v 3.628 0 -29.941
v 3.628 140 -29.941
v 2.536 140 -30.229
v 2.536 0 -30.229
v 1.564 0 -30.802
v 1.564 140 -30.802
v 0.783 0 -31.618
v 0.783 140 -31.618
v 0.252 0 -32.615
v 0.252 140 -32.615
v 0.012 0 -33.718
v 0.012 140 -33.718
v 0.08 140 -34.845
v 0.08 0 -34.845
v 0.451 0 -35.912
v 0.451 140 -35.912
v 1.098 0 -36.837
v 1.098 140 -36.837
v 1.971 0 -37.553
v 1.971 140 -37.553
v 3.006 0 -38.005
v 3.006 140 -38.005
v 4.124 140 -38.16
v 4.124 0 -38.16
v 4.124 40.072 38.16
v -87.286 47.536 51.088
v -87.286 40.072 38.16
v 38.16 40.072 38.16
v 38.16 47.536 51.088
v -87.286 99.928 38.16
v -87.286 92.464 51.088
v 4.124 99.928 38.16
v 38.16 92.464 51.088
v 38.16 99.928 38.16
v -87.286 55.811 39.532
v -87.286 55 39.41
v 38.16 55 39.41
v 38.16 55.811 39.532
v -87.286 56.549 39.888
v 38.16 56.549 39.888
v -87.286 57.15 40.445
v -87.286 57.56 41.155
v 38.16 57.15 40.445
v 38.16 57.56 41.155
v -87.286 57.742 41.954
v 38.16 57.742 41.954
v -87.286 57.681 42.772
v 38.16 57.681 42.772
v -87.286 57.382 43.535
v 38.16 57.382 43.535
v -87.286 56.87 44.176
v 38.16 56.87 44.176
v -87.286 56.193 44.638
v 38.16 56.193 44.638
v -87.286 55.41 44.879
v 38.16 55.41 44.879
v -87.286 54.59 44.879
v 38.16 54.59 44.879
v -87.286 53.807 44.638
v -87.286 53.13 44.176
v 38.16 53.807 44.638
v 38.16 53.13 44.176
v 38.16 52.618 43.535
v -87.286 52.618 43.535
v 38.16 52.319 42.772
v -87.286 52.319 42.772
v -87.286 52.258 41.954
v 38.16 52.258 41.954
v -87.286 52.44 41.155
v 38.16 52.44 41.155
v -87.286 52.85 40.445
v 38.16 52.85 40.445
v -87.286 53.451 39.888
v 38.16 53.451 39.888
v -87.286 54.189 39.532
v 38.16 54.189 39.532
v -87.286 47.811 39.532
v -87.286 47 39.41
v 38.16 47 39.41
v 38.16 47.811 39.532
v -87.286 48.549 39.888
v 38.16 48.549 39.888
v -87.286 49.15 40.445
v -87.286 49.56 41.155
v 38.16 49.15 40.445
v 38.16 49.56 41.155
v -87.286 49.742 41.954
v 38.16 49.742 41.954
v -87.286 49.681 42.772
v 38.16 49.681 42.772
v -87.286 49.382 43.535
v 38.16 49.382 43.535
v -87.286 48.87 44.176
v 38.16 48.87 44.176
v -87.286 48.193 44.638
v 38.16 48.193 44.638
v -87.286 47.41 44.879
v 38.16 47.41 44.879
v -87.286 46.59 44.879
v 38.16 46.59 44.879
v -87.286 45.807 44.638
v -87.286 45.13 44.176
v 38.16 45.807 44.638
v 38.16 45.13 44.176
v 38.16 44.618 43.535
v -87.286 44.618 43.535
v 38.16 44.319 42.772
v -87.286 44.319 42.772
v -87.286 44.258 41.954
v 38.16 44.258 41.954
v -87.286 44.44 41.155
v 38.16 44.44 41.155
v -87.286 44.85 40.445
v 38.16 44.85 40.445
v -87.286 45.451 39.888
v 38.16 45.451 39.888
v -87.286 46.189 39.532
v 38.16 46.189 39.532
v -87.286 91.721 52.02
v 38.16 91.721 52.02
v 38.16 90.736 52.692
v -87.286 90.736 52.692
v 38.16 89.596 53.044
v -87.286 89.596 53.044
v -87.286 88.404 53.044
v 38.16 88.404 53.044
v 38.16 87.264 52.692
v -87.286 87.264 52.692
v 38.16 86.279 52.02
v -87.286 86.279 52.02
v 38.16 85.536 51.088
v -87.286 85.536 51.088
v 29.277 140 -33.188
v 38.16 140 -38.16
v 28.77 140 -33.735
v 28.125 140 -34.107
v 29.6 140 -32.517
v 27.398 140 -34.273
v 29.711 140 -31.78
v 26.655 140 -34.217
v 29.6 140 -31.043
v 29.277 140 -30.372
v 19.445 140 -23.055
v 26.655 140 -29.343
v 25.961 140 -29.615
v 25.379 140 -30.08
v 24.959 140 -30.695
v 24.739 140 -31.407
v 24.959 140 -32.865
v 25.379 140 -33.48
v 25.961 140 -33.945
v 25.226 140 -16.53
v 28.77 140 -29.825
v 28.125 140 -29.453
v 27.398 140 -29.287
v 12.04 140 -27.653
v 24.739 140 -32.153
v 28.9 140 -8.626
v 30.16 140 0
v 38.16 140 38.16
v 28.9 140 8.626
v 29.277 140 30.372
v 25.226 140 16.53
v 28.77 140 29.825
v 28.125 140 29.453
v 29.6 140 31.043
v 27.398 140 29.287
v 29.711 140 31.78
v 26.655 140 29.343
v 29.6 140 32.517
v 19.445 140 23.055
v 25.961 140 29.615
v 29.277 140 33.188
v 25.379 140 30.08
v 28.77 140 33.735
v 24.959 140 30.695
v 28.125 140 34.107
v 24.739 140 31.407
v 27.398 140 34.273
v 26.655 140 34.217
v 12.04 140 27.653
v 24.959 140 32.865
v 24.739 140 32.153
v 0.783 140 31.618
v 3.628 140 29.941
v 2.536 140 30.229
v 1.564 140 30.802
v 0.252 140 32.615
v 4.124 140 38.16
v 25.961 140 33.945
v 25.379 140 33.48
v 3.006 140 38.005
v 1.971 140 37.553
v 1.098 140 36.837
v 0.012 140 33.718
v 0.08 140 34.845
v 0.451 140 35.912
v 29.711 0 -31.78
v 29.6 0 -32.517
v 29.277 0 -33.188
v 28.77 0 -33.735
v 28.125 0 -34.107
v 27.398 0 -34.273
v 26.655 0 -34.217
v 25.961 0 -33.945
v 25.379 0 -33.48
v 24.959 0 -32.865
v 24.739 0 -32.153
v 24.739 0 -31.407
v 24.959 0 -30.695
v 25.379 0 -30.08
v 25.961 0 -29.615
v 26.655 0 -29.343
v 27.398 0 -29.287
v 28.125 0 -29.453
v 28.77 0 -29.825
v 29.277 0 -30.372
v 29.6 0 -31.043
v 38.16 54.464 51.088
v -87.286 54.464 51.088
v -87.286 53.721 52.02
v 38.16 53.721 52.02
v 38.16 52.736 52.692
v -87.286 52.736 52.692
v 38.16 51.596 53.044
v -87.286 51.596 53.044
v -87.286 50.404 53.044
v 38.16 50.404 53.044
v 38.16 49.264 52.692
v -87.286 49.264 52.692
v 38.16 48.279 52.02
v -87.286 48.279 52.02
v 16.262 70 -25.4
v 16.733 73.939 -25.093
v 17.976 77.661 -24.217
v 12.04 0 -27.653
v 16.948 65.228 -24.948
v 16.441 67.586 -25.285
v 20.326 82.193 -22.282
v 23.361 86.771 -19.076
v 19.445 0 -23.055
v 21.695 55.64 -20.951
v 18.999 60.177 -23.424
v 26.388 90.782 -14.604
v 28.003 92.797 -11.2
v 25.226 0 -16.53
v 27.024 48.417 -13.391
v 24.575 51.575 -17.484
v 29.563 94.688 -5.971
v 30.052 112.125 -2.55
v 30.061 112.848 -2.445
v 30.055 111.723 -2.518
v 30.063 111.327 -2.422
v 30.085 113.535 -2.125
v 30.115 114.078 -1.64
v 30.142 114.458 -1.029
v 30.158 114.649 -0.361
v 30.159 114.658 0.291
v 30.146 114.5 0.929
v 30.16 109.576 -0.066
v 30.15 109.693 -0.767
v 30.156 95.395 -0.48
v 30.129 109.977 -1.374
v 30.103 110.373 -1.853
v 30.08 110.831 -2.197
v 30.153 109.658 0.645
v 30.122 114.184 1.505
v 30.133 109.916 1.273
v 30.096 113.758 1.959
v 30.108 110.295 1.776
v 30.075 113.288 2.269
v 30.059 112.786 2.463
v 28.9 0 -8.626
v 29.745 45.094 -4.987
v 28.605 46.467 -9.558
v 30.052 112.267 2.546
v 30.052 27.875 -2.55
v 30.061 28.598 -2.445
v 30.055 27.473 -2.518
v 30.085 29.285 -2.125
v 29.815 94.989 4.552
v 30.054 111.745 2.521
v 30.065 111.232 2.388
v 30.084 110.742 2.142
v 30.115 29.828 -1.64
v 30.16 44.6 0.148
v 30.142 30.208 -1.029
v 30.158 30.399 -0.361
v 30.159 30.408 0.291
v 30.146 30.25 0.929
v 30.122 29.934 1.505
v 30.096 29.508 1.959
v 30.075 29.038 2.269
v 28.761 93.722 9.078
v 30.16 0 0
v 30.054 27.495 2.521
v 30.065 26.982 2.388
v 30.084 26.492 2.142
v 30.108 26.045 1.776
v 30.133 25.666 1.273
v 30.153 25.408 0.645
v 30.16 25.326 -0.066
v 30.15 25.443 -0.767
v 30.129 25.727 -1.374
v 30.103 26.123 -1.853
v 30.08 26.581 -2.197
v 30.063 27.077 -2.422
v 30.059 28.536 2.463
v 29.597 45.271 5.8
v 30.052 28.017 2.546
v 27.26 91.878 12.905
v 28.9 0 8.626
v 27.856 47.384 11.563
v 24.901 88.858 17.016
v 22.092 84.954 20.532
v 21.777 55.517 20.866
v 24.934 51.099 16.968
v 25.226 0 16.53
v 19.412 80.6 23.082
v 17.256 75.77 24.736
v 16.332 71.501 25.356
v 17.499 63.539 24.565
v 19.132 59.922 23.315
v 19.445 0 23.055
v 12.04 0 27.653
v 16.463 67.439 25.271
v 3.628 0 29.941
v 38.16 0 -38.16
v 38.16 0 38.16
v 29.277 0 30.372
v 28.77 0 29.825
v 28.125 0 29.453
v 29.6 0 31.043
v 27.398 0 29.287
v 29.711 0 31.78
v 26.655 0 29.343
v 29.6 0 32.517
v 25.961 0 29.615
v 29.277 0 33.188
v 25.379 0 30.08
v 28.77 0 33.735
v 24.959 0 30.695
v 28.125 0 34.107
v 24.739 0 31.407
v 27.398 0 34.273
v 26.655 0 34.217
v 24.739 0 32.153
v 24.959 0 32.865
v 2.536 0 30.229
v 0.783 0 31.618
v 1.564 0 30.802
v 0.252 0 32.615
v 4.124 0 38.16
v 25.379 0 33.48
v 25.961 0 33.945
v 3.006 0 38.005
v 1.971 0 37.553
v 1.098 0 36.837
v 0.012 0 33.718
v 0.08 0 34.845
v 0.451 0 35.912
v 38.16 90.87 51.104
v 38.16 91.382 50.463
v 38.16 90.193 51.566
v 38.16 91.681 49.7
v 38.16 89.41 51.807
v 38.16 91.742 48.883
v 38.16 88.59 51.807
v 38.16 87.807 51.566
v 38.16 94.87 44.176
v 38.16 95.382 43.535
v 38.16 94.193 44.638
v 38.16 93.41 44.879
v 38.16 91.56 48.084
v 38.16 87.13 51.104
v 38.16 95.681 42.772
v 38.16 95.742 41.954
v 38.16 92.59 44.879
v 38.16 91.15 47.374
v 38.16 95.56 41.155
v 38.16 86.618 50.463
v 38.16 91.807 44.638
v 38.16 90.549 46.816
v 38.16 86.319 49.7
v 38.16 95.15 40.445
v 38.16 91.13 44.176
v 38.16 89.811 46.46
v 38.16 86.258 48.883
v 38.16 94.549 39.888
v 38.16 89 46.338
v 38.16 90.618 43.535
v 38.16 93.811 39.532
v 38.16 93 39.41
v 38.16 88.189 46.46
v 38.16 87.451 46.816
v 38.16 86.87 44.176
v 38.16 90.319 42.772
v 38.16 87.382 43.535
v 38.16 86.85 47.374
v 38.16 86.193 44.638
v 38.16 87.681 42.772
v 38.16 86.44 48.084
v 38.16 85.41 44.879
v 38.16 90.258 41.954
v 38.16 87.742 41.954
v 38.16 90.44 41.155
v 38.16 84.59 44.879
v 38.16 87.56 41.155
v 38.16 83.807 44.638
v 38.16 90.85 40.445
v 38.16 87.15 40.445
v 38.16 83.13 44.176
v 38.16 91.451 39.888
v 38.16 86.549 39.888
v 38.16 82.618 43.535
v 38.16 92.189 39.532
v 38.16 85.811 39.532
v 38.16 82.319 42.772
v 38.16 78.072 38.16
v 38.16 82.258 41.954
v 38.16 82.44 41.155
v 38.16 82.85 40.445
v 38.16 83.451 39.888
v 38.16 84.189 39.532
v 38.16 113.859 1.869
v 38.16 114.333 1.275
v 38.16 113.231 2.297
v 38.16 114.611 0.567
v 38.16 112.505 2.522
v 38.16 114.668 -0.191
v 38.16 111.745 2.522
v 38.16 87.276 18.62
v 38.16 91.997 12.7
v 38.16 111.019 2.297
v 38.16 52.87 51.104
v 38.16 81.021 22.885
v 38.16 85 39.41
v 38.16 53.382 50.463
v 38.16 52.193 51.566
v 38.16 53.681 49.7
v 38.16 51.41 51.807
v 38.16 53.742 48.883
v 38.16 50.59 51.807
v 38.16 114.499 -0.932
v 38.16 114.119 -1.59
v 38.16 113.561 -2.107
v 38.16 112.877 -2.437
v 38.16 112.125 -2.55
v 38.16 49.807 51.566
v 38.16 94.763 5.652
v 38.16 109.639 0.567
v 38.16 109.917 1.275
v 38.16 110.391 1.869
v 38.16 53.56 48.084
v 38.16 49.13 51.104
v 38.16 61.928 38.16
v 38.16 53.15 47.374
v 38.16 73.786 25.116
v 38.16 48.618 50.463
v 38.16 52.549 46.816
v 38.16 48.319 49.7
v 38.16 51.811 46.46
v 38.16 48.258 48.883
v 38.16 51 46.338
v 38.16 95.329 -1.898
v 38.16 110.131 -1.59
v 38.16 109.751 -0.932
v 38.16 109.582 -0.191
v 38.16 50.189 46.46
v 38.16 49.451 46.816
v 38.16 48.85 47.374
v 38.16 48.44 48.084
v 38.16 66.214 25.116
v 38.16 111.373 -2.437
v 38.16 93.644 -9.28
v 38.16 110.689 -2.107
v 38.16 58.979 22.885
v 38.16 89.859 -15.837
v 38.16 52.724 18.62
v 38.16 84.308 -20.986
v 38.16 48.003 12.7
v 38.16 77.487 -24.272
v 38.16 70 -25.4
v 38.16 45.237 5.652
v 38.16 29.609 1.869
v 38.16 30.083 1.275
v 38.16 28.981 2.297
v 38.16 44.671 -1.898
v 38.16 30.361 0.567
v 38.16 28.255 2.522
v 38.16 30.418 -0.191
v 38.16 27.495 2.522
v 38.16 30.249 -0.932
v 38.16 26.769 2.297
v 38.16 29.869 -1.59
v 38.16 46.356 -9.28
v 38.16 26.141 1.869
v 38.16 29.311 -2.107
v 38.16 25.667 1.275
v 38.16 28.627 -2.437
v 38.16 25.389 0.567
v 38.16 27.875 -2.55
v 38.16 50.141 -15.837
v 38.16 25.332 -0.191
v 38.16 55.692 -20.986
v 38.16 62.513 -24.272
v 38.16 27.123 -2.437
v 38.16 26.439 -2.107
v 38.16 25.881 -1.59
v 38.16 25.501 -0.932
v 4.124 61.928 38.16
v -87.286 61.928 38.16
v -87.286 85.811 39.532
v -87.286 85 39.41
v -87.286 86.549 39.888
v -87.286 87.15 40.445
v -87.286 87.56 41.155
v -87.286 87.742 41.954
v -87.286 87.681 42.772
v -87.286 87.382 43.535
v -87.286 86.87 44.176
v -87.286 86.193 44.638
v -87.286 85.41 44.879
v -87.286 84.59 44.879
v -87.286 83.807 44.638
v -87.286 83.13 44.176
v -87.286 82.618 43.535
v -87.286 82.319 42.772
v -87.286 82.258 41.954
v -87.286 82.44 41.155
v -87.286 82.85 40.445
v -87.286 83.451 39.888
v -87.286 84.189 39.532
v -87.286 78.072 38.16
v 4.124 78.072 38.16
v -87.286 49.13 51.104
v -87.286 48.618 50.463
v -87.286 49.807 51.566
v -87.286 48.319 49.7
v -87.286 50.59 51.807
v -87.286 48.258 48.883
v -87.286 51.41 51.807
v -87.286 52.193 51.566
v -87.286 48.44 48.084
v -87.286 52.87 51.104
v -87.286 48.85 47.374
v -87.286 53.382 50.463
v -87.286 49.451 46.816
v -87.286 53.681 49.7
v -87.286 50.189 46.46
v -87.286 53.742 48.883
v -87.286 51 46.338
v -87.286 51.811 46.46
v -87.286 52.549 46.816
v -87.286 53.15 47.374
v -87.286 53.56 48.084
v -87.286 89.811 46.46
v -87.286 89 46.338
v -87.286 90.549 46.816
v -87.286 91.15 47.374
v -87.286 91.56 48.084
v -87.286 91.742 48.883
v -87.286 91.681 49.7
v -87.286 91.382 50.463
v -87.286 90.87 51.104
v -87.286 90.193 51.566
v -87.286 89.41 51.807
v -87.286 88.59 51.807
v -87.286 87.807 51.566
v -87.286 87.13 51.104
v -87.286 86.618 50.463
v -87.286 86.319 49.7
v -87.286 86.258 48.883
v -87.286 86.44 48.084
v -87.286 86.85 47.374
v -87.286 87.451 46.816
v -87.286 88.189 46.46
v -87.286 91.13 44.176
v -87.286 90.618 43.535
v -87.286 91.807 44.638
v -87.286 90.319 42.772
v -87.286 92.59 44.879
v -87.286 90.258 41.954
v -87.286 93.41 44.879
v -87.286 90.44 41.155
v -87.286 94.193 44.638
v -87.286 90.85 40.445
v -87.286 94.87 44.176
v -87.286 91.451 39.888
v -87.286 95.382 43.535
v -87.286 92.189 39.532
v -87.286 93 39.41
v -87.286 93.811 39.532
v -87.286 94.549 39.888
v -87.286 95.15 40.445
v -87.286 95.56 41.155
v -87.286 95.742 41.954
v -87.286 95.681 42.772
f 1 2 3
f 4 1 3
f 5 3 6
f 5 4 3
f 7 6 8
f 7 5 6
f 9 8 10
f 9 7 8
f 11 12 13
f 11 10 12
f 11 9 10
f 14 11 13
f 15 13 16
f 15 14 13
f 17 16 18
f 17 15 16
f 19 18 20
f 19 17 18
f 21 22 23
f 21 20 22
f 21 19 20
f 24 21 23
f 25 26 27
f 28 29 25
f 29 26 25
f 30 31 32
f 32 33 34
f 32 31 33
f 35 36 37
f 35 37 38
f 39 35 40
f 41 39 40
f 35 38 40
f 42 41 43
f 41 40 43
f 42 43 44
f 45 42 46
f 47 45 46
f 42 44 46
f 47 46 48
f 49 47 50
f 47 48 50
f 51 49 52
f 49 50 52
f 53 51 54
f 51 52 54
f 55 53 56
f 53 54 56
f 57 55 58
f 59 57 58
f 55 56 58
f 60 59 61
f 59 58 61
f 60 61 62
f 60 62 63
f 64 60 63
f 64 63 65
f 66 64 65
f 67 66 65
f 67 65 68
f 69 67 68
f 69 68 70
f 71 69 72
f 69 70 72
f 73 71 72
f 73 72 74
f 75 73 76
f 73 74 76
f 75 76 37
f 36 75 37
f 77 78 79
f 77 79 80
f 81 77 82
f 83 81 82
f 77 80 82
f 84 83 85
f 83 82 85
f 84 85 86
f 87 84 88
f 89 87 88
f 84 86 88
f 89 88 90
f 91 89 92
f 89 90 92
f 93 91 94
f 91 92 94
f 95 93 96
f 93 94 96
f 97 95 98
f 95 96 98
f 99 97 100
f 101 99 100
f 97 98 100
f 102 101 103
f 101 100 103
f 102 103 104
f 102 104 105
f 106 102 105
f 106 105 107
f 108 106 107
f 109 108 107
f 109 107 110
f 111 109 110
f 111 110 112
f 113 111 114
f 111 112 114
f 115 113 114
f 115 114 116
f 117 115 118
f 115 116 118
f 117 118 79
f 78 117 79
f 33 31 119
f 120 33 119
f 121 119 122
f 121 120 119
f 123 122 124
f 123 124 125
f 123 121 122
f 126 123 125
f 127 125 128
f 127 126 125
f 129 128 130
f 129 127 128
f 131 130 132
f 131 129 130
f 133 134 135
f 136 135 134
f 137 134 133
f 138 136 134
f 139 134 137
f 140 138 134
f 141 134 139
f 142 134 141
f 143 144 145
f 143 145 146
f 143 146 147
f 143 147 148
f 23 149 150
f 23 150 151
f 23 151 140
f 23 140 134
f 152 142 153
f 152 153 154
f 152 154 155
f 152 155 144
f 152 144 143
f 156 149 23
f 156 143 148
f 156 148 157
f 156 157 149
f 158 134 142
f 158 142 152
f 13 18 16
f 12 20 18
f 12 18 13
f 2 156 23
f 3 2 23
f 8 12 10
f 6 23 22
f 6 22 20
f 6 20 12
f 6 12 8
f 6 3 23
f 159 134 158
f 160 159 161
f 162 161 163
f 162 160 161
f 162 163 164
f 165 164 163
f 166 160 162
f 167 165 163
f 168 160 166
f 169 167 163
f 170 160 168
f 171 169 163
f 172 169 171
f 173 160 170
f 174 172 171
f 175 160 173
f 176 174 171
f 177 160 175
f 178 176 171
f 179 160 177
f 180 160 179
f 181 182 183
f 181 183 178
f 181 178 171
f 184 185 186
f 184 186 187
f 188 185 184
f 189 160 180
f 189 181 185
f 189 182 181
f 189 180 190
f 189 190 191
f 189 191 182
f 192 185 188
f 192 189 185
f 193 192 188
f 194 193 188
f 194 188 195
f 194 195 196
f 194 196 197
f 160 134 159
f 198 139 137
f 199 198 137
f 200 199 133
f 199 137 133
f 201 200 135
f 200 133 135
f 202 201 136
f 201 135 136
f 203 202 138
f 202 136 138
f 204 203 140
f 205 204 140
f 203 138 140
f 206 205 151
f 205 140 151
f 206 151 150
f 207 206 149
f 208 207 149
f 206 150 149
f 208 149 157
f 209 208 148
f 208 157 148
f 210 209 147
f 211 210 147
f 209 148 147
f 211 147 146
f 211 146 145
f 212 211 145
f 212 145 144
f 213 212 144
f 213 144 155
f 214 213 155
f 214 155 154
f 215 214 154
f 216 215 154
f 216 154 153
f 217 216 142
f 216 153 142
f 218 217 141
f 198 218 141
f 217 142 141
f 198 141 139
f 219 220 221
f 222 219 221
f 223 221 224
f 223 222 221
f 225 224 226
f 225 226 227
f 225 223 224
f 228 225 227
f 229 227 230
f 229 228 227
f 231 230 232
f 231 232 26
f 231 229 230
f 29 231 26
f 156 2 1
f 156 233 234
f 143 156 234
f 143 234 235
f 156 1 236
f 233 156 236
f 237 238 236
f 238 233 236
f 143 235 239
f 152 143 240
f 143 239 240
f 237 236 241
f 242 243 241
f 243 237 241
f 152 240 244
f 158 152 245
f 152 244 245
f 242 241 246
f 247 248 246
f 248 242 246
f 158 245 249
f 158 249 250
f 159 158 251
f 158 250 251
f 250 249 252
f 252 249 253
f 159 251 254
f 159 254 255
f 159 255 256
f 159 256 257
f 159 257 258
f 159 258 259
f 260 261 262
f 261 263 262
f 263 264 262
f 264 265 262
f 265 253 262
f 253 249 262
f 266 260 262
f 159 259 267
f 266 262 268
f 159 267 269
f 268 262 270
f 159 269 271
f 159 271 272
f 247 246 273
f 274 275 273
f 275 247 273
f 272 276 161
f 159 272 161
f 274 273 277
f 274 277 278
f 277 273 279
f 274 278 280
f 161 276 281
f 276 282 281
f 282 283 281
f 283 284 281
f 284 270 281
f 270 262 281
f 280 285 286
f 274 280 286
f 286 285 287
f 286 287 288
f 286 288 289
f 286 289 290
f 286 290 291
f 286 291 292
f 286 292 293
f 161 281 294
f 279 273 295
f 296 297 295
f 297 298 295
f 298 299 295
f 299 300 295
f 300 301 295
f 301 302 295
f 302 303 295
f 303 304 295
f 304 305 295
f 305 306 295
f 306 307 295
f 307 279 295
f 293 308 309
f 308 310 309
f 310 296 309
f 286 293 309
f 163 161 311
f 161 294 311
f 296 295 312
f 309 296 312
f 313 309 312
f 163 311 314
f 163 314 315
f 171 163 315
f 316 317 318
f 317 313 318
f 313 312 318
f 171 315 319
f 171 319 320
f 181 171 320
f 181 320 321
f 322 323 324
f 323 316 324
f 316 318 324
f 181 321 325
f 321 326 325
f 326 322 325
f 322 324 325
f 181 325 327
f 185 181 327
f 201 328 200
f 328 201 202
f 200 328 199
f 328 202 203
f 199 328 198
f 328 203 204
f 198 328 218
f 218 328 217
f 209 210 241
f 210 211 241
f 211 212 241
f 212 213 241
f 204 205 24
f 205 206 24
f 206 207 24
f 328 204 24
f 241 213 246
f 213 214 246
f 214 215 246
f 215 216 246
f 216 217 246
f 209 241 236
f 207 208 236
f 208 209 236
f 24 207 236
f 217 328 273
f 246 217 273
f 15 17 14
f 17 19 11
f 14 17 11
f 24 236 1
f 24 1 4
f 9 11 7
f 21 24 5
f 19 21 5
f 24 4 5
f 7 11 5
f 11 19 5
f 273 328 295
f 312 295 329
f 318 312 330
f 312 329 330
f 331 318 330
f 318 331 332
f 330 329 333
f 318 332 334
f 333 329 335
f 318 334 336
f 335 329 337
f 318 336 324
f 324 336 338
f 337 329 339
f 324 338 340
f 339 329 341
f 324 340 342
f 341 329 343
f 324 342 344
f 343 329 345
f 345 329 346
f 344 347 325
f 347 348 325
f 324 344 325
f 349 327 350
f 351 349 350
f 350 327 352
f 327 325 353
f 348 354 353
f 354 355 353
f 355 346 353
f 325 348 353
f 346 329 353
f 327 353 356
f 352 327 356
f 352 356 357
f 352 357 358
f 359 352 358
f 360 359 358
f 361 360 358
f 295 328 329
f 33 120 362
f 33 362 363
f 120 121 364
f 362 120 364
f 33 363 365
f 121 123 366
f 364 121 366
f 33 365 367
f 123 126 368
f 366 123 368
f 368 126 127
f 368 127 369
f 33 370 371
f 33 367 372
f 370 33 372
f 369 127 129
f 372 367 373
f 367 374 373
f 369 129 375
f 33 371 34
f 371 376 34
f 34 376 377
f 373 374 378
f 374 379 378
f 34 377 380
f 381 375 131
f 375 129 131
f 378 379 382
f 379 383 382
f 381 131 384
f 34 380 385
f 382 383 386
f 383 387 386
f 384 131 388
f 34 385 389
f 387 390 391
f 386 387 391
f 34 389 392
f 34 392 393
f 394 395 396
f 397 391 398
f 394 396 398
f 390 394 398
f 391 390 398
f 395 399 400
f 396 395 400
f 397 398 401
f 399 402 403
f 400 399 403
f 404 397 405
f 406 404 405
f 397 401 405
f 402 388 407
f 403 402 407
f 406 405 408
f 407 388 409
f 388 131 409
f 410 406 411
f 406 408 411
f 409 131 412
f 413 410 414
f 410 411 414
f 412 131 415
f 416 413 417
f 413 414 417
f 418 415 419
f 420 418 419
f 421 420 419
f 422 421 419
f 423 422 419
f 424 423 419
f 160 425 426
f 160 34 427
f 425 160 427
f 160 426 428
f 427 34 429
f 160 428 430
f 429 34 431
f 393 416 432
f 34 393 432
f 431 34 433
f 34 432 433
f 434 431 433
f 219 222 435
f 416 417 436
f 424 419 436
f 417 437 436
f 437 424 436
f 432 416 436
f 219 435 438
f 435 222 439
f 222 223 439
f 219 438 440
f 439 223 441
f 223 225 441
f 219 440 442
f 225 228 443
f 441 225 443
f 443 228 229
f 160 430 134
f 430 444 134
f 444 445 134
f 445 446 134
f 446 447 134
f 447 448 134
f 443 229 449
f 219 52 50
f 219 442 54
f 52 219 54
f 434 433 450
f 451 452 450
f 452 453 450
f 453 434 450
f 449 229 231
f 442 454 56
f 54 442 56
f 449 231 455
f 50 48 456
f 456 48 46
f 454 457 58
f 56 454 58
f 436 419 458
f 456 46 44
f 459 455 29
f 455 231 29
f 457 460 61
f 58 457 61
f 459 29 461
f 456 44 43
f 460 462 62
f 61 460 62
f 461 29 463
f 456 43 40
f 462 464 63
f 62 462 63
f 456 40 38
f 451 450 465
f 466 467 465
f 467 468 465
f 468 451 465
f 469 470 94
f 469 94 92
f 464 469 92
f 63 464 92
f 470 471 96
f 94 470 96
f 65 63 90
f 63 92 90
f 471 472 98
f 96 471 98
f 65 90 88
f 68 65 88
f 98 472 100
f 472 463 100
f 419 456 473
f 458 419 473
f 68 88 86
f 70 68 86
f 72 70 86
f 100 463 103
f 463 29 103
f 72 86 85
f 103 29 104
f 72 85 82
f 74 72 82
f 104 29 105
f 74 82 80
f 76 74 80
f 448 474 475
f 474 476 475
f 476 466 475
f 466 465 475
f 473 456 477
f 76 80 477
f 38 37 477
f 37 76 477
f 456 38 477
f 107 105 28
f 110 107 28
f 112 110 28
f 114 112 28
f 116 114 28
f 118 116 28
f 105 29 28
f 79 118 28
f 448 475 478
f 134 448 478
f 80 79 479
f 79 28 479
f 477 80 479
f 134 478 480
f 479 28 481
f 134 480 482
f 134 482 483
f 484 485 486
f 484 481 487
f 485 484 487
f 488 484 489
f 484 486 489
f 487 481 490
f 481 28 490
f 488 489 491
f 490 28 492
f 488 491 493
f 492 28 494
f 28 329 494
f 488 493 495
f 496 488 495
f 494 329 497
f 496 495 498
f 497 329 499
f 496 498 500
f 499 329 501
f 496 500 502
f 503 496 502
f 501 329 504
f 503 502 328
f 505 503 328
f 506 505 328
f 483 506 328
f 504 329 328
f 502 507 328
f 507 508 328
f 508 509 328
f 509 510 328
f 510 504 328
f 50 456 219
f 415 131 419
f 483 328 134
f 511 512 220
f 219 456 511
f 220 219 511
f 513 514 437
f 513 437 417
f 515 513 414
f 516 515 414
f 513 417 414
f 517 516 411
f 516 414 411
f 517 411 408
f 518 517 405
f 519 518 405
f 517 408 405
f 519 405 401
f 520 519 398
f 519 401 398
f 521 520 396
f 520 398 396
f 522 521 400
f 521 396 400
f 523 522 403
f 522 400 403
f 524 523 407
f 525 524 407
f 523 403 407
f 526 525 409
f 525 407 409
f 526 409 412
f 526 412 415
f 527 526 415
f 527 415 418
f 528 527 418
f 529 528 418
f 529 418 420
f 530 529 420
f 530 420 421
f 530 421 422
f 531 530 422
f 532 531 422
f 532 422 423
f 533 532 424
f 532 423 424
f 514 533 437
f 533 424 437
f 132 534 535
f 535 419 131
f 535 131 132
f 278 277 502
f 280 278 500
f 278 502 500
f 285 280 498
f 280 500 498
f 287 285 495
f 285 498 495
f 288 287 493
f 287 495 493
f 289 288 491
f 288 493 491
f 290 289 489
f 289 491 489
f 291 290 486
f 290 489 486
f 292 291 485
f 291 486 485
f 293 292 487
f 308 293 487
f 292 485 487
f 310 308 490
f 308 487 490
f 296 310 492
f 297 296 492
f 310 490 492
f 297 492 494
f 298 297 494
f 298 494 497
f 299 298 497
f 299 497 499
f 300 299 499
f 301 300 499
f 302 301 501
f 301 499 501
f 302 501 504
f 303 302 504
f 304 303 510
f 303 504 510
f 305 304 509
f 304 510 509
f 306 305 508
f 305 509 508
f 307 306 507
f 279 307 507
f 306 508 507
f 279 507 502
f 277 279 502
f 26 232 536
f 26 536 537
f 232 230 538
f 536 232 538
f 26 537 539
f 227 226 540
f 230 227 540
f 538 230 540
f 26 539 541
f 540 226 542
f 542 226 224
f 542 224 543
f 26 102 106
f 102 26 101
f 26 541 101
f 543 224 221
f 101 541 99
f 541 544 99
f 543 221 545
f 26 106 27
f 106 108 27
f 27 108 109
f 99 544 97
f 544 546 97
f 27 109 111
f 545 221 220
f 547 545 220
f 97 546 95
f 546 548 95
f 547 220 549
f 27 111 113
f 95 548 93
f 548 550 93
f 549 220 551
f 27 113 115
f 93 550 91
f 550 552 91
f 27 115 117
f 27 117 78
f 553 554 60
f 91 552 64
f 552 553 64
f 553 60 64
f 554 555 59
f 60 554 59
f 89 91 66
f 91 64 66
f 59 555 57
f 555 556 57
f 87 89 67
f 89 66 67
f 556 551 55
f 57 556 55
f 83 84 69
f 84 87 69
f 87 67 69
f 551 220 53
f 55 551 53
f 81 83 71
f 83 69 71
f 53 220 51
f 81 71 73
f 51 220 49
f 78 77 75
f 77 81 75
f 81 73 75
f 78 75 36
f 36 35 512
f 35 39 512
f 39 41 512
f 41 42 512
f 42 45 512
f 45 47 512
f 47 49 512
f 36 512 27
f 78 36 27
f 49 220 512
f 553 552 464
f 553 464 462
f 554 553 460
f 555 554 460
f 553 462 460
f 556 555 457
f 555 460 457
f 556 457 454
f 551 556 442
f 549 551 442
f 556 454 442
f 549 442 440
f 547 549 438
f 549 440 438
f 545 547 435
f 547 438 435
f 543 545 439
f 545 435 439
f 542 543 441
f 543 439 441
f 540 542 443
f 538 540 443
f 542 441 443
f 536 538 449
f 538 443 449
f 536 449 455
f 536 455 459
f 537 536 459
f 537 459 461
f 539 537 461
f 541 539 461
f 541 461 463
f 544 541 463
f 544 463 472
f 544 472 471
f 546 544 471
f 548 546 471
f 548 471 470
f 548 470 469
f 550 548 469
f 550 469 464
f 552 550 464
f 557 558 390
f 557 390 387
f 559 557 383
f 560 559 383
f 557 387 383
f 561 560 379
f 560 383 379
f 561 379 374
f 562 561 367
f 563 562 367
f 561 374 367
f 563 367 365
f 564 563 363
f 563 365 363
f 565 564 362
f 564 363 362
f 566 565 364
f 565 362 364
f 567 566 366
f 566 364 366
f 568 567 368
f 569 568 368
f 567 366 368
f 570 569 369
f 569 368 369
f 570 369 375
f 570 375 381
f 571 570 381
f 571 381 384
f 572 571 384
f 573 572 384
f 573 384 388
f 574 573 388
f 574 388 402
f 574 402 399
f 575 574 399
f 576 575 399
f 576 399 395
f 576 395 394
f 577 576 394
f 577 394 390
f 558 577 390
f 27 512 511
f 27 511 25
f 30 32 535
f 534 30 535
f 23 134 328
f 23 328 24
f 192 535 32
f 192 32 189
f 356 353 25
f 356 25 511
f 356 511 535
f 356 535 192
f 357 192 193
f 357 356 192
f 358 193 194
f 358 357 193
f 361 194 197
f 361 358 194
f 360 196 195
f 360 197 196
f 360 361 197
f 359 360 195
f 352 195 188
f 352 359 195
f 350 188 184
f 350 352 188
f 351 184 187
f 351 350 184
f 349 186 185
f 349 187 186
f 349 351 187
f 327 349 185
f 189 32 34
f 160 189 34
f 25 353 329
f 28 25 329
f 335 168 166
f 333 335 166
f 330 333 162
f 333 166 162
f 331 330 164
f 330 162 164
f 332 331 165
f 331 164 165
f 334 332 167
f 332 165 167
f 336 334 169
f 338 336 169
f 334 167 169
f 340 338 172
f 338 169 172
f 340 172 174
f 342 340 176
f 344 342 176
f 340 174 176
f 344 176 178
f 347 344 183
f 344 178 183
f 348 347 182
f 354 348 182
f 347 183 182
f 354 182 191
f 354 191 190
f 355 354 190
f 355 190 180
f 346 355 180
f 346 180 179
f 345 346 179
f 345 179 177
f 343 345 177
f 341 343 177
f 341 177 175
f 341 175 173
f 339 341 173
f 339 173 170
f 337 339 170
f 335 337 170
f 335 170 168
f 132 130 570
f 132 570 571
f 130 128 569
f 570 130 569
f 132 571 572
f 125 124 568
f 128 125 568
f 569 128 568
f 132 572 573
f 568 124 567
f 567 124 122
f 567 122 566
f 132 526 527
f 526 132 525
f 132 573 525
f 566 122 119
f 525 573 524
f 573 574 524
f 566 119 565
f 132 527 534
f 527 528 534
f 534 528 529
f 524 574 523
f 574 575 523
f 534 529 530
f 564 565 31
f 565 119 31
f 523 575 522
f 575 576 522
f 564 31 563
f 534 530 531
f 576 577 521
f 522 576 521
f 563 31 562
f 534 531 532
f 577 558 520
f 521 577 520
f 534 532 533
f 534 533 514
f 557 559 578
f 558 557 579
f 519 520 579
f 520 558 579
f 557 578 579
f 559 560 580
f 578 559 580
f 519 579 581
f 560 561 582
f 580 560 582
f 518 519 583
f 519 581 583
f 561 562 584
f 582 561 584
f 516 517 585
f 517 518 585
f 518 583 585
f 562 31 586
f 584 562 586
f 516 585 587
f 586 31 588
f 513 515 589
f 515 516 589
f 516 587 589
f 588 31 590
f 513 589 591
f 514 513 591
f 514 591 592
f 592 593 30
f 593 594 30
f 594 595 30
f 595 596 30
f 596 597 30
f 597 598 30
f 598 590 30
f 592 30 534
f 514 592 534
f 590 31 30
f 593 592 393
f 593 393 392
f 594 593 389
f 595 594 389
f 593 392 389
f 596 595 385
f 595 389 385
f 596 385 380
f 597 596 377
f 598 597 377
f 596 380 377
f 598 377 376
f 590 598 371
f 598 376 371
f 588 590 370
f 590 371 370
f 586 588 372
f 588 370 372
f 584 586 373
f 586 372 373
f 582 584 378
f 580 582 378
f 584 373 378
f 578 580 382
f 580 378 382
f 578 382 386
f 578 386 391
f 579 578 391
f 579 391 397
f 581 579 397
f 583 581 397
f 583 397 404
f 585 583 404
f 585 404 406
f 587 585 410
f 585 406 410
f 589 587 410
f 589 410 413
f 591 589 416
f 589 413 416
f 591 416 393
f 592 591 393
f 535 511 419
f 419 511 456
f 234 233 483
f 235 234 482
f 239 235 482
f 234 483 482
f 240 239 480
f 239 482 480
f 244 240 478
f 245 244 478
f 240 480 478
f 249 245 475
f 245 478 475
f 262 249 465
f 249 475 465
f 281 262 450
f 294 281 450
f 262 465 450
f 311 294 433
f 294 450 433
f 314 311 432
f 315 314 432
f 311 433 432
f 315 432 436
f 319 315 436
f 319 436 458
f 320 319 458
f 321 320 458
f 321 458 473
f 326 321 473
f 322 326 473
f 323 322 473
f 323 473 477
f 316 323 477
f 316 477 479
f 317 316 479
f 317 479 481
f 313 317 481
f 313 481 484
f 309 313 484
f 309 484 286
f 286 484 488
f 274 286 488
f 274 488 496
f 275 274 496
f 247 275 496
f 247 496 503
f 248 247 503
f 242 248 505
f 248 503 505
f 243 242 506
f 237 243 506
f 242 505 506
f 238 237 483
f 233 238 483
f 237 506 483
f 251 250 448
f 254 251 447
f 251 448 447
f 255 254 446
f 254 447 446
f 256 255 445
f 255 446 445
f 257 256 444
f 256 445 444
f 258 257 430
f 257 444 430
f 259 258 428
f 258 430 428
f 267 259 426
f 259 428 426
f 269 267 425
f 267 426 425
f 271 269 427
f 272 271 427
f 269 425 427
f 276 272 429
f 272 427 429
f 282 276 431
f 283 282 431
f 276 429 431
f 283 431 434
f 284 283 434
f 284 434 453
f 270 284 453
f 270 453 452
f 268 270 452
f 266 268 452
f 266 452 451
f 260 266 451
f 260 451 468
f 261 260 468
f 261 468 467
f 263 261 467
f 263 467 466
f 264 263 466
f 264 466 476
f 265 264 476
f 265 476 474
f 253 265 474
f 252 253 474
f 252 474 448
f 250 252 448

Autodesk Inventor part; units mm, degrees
ref_plane "YZ Plane" through (0, 0, 0) normal (1, 0, 0) x (0, 1, 0)
ref_plane "XZ Plane" through (0, 0, 0) normal (0, 1, 0) x (-1, 0, 0)
sketch "Sketch1" plane through (0, 0, 0) normal (0, 1, 0) x (-1, 0, 0)
  arc A0 (0, 30.16) -> (-3.6283, 29.941) centre (0, 0) ccw construction
  arc A1 (-26.9832, 26.9832) -> (-36.0277, -12.5774) centre (0, 0) ccw construction
  line L0 (38.16, 38.16) -> (0, 38.16) construction
  line L1 (-38.16, 38.16) -> (-38.16, -38.16)
  line L2 (-38.16, -38.16) -> (-4.1245, -38.16)
  line L3 (38.16, -38.16) -> (38.16, 38.16) construction
  line L4 (38.16, 38.16) -> (-21.3263, -21.3263) construction
  line L5 (-38.16, 38.16) -> (-21.3263, 21.3263) construction
  line L6 (0, 38.16) -> (-4.1245, 38.16) construction
  line L7 (0, -38.16) -> (38.16, -38.16) construction
  arc A2 (0, 38.16) -> (-26.9832, 26.9832) centre (0, 0) ccw construction
  arc A3 (-36.9415, -9.566) -> (-26.9832, -26.9832) centre (0, 0) ccw construction
  arc A4 (-26.9832, -26.9832) -> (0, -38.16) centre (0, 0) ccw construction
  arc A5 (0, -38.16) -> (0, 38.16) centre (0, 0) ccw construction
  line L8 (-21.3263, 21.3263) -> (38.16, -38.16) construction
  line L9 (-21.3263, -21.3263) -> (-38.16, -38.16) construction
  line L10 (0, 38.16) -> (0, 30.16) construction
  line L11 (0, -30.16) -> (0, -38.16) construction
  arc A6 (21.3263, 21.3263) -> (0, 30.16) centre (0, 0) ccw construction
  arc A7 (0, -30.16) -> (21.3263, 21.3263) centre (0, 0) ccw construction
  arc A8 (-6.0651, -37.6749) -> (-3.6283, -29.941) centre (-4.1245, -34.0355) ccw
  arc A9 (-3.6283, 29.941) -> (-6.0651, 37.6749) centre (-4.1245, 34.0355) ccw
  line L12 (-4.1245, -38.16) -> (0, -38.16) construction
  arc A10 (-3.6283, -29.941) -> (0, -30.16) centre (0, 0) ccw construction
  arc A11 (-3.6283, 29.941) -> (-3.6283, -29.941) centre (0, 0) ccw
  line L13 (-4.1245, 38.16) -> (-38.16, 38.16)
  arc A12 (-3.6283, -29.941) -> (-6.0651, -37.6749) centre (-4.1245, -34.0355) ccw construction
  arc A13 (-6.0651, 37.6749) -> (-3.6283, 29.941) centre (-4.1245, 34.0355) ccw construction
  dimension "d0" = 60.32
  dimension "d1" = 8
extrude "Extrusion1" add sketch "Sketch1" along normal blind 140
sketch "Sketch2" plane through (38.16, 0, 38.16) normal (1, 0, 0) x (0, 0, -1)
  line L0 (8.219, 140) -> (0, 140) projected
  line L1 (0, 140) -> (76.32, 0) construction
  line L2 (76.32, 140) -> (0, 0) construction
  circle A0 centre (38.16, 70) radius 25.4
  dimension "d15" = 50.8
extrude "Extrusion2" cut sketch "Sketch2" against normal up to next
ref_plane "Work Plane1" through (0, 70, 0) normal (0, 1, 0) x (1, 0, 0)
sketch "Sketch3" plane through (0, 70, 0) normal (0, 1, 0) x (1, 0, 0)
  line L0 (38.16, 38.16) -> (4.1245, 38.16) projected
  line L1 (38.16, 25.4) -> (16.2624, 25.4) projected
  line L2 (38.16, -38.16) -> (38.16, 38.16) projected
  line L3 (38.16, -25.4) -> (16.2624, -25.4) projected
  line L4 (4.1245, -38.16) -> (38.16, -38.16) projected
  line L5 (16.2624, 25.4) -> (38.16, 38.16) construction
  line L6 (38.16, 25.4) -> (16.2624, 38.16) construction
  line L7 (16.2624, -25.4) -> (38.16, -38.16) construction
  line L8 (38.16, -25.4) -> (16.2624, -38.16) construction
  circle A0 centre (27.2112, 31.78) radius 2.5
  circle A1 centre (27.2112, -31.78) radius 2.5
  dimension "d16" = 5
  dimension "d17" = 5
extrude "Extrusion3" cut sketch "Sketch3" along normal through all both and the other way through all
sketch "Sketch5" plane through (38.16, 0, 38.16) normal (1, 0, 0) x (0, 0, -1)
  circle A0 centre (38.16, 70) radius 25.4 projected
  line L0 (0, 140) -> (76.32, 140) projected
  line L1 (0, 0) -> (76.32, 0) projected
  line L2 (38.16, 95.4) -> (38.16, 140) construction
  line L3 (38.16, 44.6) -> (38.16, 0) construction
  circle A1 centre (38.16, 112.125) radius 2.55
  circle A2 centre (38.16, 27.875) radius 2.55
  line L4 (38.16, 22.3) -> (38.16, 44.6) construction
  line L5 (38.16, 117.7) -> (38.16, 95.4) construction
  line L6 (38.16, 22.3) -> (38.16, 33.45)
  line L7 (38.16, 117.7) -> (38.16, 106.55)
  dimension "d18" = 5.1
  dimension "d19" = 5.1
extrude "Extrusion4" cut sketch "Sketch5" against normal up to next contours A1 L7 | L7 A1 | A2 L6 | L6 A2
ref_plane "Work Plane2" through (4.1245, 0, 0) normal (0, 0, 1) x (1, 0, 0)
sketch "Sketch7" plane through (38.16, 0, 38.16) normal (1, 0, 0) x (0, 0, -1)
  line L0 (0, 0) -> (0, 140) construction
  line L1 (0, 140) -> (0, 0) construction
  line L2 (0, 89) -> (0, 51)
  circle A0 centre (-4, 93) radius 4 construction
  circle A1 centre (-4, 93) radius 2.75
  circle A2 centre (-4, 85) radius 4 construction
  circle A3 centre (-4, 85) radius 2.75
  arc A4 (-12.9282, 85.5359) -> (-12.9282, 92.4641) centre (-10.9282, 89) ccw construction
  circle A5 centre (-10.9282, 89) radius 2.75
  line L3 (0, 70) -> (-10, 70) construction
  line L4 (0, 89) -> (-10, 89) construction
  line L5 (0, 78.0718) -> (-12.9282, 85.5359)
  line L6 (-12.9282, 92.4641) -> (0, 99.9282)
  arc A6 (-12.9282, 92.4641) -> (-12.9282, 85.5359) centre (-10.9282, 89) ccw
  circle A7 centre (-4, 47) radius 4 construction
  circle A8 centre (-4, 47) radius 2.75
  circle A9 centre (-4, 55) radius 4 construction
  circle A10 centre (-4, 55) radius 2.75
  arc A11 (-12.9282, 47.5359) -> (-12.9282, 54.4641) centre (-10.9282, 51) ccw construction
  circle A12 centre (-10.9282, 51) radius 2.75
  line L7 (0, 51) -> (-10, 51) construction
  line L8 (0, 61.9282) -> (-12.9282, 54.4641)
  line L9 (-12.9282, 47.5359) -> (0, 40.0718)
  arc A13 (-12.9282, 54.4641) -> (-12.9282, 47.5359) centre (-10.9282, 51) ccw
  line L10 (0, 89) -> (0, 99.9282)
  line L11 (0, 51) -> (0, 40.0718)
  point P0 (38.16, 0)
  dimension "d26" = 38
  dimension "d27" = 8
  dimension "d28" = 5.5
  dimension "d29" = 8
  dimension "d30" = 5.5
  dimension "d31" = 8
  dimension "d32" = 5.5
  dimension "d33" = 10
  dimension "d34" = 10
extrude "Extrusion6" add sketch "Sketch7" against normal blind 125.446
properties part number "Tubo Exterior" material "ABS Plastic"
